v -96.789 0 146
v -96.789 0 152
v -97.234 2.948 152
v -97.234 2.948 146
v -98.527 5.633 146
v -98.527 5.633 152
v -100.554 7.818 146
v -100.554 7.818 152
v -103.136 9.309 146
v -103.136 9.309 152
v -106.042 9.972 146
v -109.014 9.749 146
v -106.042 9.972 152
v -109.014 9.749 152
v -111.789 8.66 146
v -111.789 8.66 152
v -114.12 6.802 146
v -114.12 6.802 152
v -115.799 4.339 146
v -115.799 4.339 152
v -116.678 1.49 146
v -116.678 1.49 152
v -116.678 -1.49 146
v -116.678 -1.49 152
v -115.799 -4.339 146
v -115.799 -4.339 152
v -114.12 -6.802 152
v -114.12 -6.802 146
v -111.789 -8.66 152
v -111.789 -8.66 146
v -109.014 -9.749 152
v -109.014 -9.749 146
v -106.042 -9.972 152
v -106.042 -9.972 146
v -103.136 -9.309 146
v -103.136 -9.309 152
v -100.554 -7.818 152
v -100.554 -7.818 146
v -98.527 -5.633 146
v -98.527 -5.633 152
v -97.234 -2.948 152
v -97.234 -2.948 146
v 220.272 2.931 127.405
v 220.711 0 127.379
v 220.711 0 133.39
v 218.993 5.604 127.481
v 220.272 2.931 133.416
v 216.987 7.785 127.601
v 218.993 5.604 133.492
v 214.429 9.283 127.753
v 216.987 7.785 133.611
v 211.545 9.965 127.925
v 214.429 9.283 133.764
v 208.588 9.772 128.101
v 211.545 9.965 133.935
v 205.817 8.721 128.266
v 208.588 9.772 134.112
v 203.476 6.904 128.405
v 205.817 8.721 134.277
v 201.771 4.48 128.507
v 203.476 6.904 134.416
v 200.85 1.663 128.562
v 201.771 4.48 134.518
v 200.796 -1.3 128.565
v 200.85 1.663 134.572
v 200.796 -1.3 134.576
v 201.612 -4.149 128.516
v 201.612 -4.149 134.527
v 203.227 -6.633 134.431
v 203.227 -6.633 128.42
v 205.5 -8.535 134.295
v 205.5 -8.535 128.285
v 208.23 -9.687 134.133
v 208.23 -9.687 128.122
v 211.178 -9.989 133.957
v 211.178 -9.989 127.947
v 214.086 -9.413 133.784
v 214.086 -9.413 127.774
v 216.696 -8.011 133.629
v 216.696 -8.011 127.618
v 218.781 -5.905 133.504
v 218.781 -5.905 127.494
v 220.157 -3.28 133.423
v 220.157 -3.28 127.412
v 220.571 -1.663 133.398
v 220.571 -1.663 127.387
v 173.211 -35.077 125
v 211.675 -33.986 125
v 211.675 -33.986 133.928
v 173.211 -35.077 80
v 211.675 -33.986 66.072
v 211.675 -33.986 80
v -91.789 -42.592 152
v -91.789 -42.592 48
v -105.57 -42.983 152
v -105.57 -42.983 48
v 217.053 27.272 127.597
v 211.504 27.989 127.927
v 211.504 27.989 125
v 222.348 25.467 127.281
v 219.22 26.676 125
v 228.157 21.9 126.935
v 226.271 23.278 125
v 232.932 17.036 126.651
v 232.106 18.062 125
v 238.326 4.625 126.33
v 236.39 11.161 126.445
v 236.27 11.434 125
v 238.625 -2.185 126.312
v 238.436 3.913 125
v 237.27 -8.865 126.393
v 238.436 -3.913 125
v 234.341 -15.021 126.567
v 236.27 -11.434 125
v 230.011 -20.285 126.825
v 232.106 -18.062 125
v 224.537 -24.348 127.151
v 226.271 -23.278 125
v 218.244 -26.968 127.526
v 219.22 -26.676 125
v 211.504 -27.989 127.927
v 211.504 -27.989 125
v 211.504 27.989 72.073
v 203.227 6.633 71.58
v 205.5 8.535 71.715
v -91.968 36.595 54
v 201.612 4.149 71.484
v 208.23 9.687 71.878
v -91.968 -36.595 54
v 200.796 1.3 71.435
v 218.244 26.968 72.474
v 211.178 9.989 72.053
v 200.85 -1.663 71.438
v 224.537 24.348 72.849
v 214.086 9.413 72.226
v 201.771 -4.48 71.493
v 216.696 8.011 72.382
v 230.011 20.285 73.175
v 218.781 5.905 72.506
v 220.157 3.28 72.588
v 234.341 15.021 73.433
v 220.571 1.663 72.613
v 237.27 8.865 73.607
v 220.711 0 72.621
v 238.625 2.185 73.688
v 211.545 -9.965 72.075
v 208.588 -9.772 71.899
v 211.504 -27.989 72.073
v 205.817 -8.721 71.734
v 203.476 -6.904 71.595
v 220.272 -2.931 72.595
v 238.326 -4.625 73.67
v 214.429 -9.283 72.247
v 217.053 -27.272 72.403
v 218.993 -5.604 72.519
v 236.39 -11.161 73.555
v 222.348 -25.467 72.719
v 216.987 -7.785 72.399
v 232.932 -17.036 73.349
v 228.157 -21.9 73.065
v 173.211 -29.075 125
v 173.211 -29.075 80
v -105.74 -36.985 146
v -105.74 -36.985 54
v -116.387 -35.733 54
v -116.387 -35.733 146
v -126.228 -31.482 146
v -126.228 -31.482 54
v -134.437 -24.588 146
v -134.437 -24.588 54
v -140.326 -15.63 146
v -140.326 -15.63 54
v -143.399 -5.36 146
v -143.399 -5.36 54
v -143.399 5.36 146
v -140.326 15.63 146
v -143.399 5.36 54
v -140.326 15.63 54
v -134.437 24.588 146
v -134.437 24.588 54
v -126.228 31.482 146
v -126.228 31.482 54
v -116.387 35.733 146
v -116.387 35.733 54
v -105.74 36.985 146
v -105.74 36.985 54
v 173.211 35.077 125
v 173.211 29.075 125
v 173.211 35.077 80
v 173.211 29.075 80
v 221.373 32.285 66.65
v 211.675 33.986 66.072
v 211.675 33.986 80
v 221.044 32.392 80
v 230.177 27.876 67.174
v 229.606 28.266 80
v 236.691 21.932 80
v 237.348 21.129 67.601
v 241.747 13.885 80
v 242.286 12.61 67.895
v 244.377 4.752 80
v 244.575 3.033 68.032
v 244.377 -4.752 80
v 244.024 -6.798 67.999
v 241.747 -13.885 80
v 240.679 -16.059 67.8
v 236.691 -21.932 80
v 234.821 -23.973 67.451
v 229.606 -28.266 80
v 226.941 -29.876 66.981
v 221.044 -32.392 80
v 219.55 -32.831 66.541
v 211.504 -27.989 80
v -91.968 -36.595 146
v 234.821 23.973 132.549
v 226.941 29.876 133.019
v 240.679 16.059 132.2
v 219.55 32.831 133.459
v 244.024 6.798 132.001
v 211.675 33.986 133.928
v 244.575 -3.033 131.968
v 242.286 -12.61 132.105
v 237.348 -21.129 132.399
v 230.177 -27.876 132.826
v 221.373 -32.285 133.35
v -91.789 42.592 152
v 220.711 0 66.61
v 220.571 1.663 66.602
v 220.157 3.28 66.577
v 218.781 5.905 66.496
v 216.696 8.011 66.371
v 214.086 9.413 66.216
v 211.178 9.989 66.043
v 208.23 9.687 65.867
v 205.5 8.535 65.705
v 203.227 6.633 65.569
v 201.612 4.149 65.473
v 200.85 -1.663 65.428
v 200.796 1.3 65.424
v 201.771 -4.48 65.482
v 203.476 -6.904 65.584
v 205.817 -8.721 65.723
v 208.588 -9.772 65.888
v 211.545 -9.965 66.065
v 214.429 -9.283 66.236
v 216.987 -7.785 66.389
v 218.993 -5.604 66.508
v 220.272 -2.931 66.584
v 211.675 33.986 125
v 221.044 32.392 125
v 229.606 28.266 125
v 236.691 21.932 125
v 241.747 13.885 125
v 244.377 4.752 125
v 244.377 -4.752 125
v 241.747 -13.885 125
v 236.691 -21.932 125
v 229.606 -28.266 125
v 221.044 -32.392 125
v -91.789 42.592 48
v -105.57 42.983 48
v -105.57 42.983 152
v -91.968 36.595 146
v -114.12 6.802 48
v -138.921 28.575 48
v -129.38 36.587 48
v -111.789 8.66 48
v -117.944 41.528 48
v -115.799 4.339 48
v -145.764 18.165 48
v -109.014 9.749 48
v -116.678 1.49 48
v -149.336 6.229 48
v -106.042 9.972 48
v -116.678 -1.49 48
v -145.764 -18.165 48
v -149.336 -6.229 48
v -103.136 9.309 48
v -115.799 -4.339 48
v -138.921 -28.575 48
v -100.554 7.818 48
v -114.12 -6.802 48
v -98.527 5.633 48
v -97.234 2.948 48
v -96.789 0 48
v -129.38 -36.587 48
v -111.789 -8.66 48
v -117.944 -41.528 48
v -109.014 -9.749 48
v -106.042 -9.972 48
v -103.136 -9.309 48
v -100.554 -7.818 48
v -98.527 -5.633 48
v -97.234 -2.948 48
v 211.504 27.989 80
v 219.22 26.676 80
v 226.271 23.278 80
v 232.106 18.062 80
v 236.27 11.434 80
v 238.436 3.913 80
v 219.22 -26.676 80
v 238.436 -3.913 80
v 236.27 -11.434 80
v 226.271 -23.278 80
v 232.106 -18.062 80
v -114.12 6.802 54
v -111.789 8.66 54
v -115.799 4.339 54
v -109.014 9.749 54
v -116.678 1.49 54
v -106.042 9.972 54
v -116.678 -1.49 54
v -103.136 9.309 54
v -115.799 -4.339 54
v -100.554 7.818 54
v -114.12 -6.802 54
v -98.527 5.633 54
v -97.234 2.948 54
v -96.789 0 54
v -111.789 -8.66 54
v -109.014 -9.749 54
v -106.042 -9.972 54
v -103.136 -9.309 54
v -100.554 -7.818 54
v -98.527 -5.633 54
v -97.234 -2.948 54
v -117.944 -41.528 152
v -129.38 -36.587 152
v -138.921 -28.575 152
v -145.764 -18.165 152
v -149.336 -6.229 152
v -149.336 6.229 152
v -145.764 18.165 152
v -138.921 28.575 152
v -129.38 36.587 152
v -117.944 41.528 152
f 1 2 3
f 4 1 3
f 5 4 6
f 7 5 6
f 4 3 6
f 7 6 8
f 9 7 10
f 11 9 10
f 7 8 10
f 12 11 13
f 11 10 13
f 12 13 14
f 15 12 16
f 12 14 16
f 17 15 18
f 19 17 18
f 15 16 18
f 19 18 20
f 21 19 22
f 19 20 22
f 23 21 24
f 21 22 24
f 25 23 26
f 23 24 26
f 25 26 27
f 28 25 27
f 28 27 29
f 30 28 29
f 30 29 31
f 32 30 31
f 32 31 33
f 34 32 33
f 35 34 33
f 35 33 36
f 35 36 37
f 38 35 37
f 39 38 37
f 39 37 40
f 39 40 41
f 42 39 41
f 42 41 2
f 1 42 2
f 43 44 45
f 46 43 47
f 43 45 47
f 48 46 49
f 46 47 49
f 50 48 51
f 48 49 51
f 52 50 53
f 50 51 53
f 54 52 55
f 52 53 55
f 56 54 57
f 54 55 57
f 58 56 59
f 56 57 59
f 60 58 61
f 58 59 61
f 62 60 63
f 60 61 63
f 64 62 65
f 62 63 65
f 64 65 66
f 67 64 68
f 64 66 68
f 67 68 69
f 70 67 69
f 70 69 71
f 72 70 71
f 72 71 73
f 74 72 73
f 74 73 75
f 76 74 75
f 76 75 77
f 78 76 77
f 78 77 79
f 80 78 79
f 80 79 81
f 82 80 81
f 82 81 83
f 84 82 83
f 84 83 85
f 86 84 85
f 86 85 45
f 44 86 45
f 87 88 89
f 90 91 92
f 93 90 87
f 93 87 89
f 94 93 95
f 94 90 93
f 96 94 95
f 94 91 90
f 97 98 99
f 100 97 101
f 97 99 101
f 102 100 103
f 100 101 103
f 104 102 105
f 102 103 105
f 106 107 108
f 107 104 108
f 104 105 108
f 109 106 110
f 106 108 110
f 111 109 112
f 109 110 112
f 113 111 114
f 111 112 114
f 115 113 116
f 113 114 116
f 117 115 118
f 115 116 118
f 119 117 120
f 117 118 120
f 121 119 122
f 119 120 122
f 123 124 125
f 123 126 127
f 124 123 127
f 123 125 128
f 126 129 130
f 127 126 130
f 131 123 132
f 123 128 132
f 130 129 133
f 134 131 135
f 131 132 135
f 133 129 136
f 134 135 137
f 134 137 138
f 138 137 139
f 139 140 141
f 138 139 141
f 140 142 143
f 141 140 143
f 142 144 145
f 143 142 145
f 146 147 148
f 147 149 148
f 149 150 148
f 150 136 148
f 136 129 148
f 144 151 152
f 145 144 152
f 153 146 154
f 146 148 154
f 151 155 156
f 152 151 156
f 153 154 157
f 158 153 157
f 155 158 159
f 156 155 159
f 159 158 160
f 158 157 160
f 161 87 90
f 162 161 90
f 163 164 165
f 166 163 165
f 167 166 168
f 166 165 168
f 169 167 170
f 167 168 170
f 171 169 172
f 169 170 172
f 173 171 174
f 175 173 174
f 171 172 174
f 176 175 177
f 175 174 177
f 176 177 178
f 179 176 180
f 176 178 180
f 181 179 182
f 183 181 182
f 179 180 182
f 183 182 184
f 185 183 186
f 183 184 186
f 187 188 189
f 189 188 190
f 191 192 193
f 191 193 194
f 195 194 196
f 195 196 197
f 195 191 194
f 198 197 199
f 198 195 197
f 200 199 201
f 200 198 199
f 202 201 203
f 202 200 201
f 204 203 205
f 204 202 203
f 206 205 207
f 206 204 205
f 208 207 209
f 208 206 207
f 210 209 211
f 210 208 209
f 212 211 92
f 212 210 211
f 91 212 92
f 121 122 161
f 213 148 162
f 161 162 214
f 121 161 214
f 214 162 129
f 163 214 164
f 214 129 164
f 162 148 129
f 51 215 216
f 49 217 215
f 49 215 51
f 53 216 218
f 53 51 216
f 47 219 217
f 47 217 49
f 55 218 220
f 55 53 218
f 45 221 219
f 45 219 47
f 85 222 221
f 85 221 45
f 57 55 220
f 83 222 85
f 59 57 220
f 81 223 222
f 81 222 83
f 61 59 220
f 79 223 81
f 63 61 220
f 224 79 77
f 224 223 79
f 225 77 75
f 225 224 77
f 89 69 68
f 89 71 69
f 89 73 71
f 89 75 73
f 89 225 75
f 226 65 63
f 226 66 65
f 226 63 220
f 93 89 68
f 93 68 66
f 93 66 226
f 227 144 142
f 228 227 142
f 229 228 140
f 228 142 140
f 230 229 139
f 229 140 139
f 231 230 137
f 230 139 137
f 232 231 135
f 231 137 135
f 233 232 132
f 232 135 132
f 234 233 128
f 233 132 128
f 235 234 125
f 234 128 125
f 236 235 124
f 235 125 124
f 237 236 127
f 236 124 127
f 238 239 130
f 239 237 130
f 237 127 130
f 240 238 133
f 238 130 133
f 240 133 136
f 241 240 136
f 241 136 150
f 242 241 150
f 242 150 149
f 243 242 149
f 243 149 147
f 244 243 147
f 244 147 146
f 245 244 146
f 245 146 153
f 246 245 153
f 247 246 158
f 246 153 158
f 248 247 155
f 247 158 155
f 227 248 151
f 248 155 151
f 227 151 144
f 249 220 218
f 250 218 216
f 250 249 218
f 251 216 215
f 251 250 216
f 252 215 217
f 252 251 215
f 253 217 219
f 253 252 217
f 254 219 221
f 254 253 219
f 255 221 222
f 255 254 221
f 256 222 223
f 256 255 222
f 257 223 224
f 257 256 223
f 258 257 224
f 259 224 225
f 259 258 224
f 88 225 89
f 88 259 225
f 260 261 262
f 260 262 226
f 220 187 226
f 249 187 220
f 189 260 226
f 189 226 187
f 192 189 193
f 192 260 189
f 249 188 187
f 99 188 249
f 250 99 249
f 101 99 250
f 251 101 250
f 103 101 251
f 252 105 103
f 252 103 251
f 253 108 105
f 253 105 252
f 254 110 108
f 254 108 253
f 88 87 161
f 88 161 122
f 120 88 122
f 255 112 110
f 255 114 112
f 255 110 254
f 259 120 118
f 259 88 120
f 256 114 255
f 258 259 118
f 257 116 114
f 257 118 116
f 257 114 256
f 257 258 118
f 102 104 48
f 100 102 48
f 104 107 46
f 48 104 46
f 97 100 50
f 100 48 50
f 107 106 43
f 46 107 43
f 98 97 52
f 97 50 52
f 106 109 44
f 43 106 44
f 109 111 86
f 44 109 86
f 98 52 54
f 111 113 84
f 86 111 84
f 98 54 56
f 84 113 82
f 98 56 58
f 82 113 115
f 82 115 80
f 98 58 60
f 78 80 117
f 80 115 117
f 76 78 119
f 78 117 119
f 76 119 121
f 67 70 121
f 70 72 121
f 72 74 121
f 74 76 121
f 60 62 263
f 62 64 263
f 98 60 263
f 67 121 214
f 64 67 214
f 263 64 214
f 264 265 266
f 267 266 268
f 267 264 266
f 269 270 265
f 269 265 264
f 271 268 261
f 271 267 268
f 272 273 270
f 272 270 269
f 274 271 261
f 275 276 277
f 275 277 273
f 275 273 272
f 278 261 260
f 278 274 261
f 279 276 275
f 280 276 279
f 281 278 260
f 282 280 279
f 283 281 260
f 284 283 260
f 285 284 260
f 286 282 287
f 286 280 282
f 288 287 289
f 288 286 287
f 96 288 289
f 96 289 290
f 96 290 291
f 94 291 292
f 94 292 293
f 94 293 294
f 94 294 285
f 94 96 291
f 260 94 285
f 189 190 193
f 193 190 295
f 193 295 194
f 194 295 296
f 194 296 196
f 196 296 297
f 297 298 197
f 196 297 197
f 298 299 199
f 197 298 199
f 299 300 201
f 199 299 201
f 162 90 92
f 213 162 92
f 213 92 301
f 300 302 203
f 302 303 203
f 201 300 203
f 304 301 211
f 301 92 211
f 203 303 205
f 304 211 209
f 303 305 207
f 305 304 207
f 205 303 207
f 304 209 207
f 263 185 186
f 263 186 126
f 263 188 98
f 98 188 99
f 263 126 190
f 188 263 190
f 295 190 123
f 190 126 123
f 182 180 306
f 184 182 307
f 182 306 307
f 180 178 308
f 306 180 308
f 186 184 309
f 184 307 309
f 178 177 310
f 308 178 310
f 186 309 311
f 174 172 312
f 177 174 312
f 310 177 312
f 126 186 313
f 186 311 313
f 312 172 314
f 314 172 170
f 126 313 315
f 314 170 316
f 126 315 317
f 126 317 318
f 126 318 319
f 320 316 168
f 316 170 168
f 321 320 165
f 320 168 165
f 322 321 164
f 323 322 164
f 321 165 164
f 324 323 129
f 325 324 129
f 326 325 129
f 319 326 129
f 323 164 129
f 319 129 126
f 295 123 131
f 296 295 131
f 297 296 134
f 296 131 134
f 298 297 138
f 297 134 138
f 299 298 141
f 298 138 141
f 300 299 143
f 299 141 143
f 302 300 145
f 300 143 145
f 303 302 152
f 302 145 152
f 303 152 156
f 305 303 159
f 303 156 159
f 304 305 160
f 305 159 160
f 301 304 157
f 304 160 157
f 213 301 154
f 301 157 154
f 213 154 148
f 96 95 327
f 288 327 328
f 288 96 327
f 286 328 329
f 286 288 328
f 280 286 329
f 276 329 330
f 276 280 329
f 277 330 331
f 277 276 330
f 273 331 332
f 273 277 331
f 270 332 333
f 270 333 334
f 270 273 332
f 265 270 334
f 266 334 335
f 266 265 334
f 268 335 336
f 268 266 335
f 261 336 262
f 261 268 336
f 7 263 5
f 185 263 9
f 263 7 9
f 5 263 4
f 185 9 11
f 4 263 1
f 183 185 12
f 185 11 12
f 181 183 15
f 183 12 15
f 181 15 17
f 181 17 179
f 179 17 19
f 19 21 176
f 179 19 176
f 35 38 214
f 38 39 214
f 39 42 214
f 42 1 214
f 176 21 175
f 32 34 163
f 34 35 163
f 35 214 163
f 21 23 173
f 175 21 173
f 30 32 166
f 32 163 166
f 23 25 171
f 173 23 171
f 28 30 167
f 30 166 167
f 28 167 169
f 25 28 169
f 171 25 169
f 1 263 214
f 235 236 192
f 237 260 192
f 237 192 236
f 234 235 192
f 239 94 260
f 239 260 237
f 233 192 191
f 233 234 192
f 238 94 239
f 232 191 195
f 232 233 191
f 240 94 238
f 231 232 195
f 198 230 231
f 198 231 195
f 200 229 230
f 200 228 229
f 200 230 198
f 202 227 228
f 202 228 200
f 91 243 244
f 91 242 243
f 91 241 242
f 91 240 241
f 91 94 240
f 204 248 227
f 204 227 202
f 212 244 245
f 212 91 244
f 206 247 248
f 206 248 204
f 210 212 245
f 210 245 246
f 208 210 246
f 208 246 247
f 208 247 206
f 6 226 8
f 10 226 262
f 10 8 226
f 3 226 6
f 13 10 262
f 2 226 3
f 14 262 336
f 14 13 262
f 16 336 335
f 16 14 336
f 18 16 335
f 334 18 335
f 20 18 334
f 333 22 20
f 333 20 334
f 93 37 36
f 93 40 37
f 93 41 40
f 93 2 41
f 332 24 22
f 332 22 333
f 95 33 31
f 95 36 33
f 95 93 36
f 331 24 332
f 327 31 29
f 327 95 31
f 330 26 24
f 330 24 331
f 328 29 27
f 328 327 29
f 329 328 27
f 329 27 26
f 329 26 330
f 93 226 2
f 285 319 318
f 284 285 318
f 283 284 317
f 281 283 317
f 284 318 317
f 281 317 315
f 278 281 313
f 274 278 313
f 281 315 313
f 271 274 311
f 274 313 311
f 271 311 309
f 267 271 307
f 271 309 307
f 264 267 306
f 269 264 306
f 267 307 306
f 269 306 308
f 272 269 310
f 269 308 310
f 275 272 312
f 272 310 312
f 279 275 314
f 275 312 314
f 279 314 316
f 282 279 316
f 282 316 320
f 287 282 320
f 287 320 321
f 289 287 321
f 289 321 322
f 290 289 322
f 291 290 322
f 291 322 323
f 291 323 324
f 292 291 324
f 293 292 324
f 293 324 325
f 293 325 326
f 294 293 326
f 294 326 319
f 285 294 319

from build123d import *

# Parameters (mm, degrees)
EXTRUSION1_DEPTH             = 200
ENL_V_MAT_EXTRU_1_DEPTH      = 319.955094772
ENL_V_MAT_EXTRU_1_DEPTH_BACK = 319.955094772
ESQUISSE4_OUTSIDE_W          = 486.616
ESQUISSE4_OUTSIDE_H          = 292.116
COQUE5_T                     = 6
ENL_V_MAT_EXTRU_2_DEPTH      = 292.26680635
ENL_V_MAT_EXTRU_2_DEPTH_BACK = 292.26680635
ESQUISSE5_W                  = 100
ESQUISSE5_H                  = 45
ESQUISSE6_R                  = 10
ENL_V_MAT_EXTRU_3_DEPTH      = 270.348013695
ESQUISSE7_R                  = 10
ENL_V_MAT_EXTRU_4_DEPTH      = 270.348013695


with BuildPart() as part:
    # Esquisse2 → Extrusion1 (new body)
    with BuildSketch(Plane.XY):
        with BuildLine():
            Line((-105.570349674, 42.982720814), (211.674532216, 33.986337388))
            ThreePointArc((211.674532216, 33.986337388), (244.710752688, 0), (211.674532216, -33.986337388))
            Line((211.674532216, -33.986337388), (-105.570349674, -42.982720814))
            ThreePointArc((-105.570349674, -42.982720814), (-149.789247312, 0), (-105.570349674, 42.982720814))
        make_face()
    extrude(amount=EXTRUSION1_DEPTH)

    # Esquisse4 outside → Enlèv. mat.-Extru.1 (cut, two sides: drawn at the far end of the back side and taken through both)
    with BuildSketch(Plane(origin=(0, 0, 0), x_dir=(1, 0, 0), z_dir=(0, 1, 0)).offset(-ENL_V_MAT_EXTRU_1_DEPTH_BACK)):
        with Locations((47.461, -100)):
            Rectangle(ESQUISSE4_OUTSIDE_W, ESQUISSE4_OUTSIDE_H)
        Polygon((-158.789247312, -152), (-158.789247312, -48), (-91.789247312, -48), (311.210752688, -72), (311.210752688, -128), (-91.789247312, -152), align=None, mode=Mode.SUBTRACT)
    extrude(amount=ENL_V_MAT_EXTRU_1_DEPTH + ENL_V_MAT_EXTRU_1_DEPTH_BACK, mode=Mode.SUBTRACT)

    # Coque5 (no face opened: a closed hollow body)
    add(offset(amount=-COQUE5_T, mode=Mode.PRIVATE), mode=Mode.SUBTRACT)

    # Esquisse5 → Enlèv. mat.-Extru.2 (cut, two sides: drawn at the far end of the back side and taken through both)
    with BuildSketch(Plane(origin=(0, 0, 0), x_dir=(1, 0, 0), z_dir=(0, 1, 0)).offset(-ENL_V_MAT_EXTRU_2_DEPTH_BACK)):
        with Locations((223.210752688, -102.5)):
            Rectangle(ESQUISSE5_W, ESQUISSE5_H)
    extrude(amount=ENL_V_MAT_EXTRU_2_DEPTH + ENL_V_MAT_EXTRU_2_DEPTH_BACK, mode=Mode.SUBTRACT)

    # Esquisse6 → Enlèv. mat.-Extru.3 (cut, through all)
    with BuildSketch(Plane.XY.offset(152)):
        with Locations((210.710752688, 0)):
            Circle(ESQUISSE6_R)
    extrude(amount=-ENL_V_MAT_EXTRU_3_DEPTH, mode=Mode.SUBTRACT)

    # Esquisse7 → Enlèv. mat.-Extru.4 (cut, through all)
    with BuildSketch(Plane.XY.offset(152)):
        with Locations((-106.789247312, 0)):
            Circle(ESQUISSE7_R)
    extrude(amount=-ENL_V_MAT_EXTRU_4_DEPTH, mode=Mode.SUBTRACT)


solid = part.part
